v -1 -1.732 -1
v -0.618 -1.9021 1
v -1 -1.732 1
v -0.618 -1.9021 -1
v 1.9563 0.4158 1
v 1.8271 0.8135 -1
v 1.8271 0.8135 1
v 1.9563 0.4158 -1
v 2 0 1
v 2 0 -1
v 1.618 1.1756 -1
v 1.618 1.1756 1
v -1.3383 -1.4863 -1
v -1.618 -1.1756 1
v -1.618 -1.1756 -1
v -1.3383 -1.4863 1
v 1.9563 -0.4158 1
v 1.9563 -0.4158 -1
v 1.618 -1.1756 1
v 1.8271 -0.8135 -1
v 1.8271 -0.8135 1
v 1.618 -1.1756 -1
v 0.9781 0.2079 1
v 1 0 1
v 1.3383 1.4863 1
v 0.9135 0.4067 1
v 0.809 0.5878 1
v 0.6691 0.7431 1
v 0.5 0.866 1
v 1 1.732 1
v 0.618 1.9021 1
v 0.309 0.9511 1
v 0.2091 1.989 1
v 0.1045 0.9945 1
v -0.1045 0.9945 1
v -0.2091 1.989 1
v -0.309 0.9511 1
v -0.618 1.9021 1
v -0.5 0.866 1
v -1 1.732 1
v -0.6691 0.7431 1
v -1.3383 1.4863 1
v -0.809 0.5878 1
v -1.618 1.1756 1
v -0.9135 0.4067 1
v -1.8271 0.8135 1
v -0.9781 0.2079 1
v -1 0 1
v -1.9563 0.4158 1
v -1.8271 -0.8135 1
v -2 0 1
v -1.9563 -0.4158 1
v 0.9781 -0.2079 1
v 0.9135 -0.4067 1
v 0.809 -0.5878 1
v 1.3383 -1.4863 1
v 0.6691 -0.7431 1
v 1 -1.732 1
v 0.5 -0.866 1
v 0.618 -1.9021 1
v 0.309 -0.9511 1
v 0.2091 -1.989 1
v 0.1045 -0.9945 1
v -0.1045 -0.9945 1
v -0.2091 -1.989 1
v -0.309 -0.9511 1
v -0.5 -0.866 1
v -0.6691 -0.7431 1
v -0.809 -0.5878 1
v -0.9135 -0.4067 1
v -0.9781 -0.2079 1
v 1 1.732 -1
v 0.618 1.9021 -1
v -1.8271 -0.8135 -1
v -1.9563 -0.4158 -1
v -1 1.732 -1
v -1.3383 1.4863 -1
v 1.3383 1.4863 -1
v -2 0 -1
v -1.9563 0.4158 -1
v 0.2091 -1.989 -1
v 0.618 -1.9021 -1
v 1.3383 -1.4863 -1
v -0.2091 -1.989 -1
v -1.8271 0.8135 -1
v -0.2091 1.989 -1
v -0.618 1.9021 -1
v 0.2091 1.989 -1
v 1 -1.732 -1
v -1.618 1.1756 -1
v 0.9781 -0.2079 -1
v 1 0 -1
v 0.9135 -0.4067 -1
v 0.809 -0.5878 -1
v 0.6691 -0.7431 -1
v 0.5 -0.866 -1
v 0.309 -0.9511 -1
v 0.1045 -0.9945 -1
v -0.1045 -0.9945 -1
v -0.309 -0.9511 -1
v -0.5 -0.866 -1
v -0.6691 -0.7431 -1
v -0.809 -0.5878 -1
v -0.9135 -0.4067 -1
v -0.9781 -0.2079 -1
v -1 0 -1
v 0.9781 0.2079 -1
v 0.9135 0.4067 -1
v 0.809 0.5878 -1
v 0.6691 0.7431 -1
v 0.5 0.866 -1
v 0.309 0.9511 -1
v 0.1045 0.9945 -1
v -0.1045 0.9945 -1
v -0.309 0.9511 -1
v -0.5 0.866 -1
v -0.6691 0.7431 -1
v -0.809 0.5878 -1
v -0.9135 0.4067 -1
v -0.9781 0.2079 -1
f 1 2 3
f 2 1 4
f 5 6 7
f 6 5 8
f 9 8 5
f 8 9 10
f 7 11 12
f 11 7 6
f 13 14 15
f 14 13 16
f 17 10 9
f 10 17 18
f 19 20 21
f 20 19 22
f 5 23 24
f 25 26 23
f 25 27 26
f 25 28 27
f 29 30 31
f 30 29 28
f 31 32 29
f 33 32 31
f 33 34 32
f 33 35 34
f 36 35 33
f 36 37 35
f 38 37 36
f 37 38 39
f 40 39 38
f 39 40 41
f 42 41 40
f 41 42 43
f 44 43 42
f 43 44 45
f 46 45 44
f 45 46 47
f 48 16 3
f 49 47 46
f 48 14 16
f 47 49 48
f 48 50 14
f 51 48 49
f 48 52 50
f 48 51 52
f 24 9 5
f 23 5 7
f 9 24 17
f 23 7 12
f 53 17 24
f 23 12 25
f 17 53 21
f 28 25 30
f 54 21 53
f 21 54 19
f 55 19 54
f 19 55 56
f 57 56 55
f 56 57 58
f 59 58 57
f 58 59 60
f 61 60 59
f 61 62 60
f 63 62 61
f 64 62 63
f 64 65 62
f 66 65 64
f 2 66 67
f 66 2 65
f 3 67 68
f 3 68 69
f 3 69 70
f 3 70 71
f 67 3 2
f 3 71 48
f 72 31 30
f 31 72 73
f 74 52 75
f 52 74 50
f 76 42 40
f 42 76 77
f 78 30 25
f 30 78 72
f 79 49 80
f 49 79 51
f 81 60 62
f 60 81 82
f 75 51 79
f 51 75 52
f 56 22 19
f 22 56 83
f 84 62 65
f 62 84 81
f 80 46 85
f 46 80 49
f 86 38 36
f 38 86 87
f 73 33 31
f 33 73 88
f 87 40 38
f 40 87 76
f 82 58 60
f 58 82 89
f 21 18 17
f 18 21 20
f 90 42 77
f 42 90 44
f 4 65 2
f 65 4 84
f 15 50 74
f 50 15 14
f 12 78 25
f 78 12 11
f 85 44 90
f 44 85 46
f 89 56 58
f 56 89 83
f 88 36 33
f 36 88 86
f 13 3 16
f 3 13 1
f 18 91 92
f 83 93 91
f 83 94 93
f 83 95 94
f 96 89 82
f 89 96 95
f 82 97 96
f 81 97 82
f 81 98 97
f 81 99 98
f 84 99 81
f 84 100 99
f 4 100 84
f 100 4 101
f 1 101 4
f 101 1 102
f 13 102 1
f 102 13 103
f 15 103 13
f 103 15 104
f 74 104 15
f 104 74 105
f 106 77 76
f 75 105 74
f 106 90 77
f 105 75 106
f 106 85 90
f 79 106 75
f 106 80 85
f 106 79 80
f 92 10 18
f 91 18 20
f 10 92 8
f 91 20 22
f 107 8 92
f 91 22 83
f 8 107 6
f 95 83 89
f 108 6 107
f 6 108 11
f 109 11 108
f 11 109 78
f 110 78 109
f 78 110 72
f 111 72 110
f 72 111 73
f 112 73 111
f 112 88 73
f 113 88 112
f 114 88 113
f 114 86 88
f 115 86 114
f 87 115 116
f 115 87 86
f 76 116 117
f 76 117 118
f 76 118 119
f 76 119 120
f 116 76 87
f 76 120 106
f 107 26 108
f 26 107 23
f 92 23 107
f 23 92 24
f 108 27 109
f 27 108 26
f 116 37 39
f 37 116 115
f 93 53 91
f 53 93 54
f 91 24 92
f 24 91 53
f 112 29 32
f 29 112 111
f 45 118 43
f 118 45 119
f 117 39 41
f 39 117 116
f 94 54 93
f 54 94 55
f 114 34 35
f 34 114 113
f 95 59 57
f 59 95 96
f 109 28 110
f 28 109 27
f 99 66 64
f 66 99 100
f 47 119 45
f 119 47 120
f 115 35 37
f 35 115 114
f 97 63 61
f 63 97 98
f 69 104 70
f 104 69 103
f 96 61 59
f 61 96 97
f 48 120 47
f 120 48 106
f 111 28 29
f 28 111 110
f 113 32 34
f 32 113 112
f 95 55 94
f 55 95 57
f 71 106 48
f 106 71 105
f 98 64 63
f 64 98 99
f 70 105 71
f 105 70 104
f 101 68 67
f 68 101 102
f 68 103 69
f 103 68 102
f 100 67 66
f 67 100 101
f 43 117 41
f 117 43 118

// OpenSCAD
$fn=30;

difference() {
    cylinder(2, 2, 2, center=true);

    union() {
            cylinder(5, 1, 1, center=true);

    }
}
